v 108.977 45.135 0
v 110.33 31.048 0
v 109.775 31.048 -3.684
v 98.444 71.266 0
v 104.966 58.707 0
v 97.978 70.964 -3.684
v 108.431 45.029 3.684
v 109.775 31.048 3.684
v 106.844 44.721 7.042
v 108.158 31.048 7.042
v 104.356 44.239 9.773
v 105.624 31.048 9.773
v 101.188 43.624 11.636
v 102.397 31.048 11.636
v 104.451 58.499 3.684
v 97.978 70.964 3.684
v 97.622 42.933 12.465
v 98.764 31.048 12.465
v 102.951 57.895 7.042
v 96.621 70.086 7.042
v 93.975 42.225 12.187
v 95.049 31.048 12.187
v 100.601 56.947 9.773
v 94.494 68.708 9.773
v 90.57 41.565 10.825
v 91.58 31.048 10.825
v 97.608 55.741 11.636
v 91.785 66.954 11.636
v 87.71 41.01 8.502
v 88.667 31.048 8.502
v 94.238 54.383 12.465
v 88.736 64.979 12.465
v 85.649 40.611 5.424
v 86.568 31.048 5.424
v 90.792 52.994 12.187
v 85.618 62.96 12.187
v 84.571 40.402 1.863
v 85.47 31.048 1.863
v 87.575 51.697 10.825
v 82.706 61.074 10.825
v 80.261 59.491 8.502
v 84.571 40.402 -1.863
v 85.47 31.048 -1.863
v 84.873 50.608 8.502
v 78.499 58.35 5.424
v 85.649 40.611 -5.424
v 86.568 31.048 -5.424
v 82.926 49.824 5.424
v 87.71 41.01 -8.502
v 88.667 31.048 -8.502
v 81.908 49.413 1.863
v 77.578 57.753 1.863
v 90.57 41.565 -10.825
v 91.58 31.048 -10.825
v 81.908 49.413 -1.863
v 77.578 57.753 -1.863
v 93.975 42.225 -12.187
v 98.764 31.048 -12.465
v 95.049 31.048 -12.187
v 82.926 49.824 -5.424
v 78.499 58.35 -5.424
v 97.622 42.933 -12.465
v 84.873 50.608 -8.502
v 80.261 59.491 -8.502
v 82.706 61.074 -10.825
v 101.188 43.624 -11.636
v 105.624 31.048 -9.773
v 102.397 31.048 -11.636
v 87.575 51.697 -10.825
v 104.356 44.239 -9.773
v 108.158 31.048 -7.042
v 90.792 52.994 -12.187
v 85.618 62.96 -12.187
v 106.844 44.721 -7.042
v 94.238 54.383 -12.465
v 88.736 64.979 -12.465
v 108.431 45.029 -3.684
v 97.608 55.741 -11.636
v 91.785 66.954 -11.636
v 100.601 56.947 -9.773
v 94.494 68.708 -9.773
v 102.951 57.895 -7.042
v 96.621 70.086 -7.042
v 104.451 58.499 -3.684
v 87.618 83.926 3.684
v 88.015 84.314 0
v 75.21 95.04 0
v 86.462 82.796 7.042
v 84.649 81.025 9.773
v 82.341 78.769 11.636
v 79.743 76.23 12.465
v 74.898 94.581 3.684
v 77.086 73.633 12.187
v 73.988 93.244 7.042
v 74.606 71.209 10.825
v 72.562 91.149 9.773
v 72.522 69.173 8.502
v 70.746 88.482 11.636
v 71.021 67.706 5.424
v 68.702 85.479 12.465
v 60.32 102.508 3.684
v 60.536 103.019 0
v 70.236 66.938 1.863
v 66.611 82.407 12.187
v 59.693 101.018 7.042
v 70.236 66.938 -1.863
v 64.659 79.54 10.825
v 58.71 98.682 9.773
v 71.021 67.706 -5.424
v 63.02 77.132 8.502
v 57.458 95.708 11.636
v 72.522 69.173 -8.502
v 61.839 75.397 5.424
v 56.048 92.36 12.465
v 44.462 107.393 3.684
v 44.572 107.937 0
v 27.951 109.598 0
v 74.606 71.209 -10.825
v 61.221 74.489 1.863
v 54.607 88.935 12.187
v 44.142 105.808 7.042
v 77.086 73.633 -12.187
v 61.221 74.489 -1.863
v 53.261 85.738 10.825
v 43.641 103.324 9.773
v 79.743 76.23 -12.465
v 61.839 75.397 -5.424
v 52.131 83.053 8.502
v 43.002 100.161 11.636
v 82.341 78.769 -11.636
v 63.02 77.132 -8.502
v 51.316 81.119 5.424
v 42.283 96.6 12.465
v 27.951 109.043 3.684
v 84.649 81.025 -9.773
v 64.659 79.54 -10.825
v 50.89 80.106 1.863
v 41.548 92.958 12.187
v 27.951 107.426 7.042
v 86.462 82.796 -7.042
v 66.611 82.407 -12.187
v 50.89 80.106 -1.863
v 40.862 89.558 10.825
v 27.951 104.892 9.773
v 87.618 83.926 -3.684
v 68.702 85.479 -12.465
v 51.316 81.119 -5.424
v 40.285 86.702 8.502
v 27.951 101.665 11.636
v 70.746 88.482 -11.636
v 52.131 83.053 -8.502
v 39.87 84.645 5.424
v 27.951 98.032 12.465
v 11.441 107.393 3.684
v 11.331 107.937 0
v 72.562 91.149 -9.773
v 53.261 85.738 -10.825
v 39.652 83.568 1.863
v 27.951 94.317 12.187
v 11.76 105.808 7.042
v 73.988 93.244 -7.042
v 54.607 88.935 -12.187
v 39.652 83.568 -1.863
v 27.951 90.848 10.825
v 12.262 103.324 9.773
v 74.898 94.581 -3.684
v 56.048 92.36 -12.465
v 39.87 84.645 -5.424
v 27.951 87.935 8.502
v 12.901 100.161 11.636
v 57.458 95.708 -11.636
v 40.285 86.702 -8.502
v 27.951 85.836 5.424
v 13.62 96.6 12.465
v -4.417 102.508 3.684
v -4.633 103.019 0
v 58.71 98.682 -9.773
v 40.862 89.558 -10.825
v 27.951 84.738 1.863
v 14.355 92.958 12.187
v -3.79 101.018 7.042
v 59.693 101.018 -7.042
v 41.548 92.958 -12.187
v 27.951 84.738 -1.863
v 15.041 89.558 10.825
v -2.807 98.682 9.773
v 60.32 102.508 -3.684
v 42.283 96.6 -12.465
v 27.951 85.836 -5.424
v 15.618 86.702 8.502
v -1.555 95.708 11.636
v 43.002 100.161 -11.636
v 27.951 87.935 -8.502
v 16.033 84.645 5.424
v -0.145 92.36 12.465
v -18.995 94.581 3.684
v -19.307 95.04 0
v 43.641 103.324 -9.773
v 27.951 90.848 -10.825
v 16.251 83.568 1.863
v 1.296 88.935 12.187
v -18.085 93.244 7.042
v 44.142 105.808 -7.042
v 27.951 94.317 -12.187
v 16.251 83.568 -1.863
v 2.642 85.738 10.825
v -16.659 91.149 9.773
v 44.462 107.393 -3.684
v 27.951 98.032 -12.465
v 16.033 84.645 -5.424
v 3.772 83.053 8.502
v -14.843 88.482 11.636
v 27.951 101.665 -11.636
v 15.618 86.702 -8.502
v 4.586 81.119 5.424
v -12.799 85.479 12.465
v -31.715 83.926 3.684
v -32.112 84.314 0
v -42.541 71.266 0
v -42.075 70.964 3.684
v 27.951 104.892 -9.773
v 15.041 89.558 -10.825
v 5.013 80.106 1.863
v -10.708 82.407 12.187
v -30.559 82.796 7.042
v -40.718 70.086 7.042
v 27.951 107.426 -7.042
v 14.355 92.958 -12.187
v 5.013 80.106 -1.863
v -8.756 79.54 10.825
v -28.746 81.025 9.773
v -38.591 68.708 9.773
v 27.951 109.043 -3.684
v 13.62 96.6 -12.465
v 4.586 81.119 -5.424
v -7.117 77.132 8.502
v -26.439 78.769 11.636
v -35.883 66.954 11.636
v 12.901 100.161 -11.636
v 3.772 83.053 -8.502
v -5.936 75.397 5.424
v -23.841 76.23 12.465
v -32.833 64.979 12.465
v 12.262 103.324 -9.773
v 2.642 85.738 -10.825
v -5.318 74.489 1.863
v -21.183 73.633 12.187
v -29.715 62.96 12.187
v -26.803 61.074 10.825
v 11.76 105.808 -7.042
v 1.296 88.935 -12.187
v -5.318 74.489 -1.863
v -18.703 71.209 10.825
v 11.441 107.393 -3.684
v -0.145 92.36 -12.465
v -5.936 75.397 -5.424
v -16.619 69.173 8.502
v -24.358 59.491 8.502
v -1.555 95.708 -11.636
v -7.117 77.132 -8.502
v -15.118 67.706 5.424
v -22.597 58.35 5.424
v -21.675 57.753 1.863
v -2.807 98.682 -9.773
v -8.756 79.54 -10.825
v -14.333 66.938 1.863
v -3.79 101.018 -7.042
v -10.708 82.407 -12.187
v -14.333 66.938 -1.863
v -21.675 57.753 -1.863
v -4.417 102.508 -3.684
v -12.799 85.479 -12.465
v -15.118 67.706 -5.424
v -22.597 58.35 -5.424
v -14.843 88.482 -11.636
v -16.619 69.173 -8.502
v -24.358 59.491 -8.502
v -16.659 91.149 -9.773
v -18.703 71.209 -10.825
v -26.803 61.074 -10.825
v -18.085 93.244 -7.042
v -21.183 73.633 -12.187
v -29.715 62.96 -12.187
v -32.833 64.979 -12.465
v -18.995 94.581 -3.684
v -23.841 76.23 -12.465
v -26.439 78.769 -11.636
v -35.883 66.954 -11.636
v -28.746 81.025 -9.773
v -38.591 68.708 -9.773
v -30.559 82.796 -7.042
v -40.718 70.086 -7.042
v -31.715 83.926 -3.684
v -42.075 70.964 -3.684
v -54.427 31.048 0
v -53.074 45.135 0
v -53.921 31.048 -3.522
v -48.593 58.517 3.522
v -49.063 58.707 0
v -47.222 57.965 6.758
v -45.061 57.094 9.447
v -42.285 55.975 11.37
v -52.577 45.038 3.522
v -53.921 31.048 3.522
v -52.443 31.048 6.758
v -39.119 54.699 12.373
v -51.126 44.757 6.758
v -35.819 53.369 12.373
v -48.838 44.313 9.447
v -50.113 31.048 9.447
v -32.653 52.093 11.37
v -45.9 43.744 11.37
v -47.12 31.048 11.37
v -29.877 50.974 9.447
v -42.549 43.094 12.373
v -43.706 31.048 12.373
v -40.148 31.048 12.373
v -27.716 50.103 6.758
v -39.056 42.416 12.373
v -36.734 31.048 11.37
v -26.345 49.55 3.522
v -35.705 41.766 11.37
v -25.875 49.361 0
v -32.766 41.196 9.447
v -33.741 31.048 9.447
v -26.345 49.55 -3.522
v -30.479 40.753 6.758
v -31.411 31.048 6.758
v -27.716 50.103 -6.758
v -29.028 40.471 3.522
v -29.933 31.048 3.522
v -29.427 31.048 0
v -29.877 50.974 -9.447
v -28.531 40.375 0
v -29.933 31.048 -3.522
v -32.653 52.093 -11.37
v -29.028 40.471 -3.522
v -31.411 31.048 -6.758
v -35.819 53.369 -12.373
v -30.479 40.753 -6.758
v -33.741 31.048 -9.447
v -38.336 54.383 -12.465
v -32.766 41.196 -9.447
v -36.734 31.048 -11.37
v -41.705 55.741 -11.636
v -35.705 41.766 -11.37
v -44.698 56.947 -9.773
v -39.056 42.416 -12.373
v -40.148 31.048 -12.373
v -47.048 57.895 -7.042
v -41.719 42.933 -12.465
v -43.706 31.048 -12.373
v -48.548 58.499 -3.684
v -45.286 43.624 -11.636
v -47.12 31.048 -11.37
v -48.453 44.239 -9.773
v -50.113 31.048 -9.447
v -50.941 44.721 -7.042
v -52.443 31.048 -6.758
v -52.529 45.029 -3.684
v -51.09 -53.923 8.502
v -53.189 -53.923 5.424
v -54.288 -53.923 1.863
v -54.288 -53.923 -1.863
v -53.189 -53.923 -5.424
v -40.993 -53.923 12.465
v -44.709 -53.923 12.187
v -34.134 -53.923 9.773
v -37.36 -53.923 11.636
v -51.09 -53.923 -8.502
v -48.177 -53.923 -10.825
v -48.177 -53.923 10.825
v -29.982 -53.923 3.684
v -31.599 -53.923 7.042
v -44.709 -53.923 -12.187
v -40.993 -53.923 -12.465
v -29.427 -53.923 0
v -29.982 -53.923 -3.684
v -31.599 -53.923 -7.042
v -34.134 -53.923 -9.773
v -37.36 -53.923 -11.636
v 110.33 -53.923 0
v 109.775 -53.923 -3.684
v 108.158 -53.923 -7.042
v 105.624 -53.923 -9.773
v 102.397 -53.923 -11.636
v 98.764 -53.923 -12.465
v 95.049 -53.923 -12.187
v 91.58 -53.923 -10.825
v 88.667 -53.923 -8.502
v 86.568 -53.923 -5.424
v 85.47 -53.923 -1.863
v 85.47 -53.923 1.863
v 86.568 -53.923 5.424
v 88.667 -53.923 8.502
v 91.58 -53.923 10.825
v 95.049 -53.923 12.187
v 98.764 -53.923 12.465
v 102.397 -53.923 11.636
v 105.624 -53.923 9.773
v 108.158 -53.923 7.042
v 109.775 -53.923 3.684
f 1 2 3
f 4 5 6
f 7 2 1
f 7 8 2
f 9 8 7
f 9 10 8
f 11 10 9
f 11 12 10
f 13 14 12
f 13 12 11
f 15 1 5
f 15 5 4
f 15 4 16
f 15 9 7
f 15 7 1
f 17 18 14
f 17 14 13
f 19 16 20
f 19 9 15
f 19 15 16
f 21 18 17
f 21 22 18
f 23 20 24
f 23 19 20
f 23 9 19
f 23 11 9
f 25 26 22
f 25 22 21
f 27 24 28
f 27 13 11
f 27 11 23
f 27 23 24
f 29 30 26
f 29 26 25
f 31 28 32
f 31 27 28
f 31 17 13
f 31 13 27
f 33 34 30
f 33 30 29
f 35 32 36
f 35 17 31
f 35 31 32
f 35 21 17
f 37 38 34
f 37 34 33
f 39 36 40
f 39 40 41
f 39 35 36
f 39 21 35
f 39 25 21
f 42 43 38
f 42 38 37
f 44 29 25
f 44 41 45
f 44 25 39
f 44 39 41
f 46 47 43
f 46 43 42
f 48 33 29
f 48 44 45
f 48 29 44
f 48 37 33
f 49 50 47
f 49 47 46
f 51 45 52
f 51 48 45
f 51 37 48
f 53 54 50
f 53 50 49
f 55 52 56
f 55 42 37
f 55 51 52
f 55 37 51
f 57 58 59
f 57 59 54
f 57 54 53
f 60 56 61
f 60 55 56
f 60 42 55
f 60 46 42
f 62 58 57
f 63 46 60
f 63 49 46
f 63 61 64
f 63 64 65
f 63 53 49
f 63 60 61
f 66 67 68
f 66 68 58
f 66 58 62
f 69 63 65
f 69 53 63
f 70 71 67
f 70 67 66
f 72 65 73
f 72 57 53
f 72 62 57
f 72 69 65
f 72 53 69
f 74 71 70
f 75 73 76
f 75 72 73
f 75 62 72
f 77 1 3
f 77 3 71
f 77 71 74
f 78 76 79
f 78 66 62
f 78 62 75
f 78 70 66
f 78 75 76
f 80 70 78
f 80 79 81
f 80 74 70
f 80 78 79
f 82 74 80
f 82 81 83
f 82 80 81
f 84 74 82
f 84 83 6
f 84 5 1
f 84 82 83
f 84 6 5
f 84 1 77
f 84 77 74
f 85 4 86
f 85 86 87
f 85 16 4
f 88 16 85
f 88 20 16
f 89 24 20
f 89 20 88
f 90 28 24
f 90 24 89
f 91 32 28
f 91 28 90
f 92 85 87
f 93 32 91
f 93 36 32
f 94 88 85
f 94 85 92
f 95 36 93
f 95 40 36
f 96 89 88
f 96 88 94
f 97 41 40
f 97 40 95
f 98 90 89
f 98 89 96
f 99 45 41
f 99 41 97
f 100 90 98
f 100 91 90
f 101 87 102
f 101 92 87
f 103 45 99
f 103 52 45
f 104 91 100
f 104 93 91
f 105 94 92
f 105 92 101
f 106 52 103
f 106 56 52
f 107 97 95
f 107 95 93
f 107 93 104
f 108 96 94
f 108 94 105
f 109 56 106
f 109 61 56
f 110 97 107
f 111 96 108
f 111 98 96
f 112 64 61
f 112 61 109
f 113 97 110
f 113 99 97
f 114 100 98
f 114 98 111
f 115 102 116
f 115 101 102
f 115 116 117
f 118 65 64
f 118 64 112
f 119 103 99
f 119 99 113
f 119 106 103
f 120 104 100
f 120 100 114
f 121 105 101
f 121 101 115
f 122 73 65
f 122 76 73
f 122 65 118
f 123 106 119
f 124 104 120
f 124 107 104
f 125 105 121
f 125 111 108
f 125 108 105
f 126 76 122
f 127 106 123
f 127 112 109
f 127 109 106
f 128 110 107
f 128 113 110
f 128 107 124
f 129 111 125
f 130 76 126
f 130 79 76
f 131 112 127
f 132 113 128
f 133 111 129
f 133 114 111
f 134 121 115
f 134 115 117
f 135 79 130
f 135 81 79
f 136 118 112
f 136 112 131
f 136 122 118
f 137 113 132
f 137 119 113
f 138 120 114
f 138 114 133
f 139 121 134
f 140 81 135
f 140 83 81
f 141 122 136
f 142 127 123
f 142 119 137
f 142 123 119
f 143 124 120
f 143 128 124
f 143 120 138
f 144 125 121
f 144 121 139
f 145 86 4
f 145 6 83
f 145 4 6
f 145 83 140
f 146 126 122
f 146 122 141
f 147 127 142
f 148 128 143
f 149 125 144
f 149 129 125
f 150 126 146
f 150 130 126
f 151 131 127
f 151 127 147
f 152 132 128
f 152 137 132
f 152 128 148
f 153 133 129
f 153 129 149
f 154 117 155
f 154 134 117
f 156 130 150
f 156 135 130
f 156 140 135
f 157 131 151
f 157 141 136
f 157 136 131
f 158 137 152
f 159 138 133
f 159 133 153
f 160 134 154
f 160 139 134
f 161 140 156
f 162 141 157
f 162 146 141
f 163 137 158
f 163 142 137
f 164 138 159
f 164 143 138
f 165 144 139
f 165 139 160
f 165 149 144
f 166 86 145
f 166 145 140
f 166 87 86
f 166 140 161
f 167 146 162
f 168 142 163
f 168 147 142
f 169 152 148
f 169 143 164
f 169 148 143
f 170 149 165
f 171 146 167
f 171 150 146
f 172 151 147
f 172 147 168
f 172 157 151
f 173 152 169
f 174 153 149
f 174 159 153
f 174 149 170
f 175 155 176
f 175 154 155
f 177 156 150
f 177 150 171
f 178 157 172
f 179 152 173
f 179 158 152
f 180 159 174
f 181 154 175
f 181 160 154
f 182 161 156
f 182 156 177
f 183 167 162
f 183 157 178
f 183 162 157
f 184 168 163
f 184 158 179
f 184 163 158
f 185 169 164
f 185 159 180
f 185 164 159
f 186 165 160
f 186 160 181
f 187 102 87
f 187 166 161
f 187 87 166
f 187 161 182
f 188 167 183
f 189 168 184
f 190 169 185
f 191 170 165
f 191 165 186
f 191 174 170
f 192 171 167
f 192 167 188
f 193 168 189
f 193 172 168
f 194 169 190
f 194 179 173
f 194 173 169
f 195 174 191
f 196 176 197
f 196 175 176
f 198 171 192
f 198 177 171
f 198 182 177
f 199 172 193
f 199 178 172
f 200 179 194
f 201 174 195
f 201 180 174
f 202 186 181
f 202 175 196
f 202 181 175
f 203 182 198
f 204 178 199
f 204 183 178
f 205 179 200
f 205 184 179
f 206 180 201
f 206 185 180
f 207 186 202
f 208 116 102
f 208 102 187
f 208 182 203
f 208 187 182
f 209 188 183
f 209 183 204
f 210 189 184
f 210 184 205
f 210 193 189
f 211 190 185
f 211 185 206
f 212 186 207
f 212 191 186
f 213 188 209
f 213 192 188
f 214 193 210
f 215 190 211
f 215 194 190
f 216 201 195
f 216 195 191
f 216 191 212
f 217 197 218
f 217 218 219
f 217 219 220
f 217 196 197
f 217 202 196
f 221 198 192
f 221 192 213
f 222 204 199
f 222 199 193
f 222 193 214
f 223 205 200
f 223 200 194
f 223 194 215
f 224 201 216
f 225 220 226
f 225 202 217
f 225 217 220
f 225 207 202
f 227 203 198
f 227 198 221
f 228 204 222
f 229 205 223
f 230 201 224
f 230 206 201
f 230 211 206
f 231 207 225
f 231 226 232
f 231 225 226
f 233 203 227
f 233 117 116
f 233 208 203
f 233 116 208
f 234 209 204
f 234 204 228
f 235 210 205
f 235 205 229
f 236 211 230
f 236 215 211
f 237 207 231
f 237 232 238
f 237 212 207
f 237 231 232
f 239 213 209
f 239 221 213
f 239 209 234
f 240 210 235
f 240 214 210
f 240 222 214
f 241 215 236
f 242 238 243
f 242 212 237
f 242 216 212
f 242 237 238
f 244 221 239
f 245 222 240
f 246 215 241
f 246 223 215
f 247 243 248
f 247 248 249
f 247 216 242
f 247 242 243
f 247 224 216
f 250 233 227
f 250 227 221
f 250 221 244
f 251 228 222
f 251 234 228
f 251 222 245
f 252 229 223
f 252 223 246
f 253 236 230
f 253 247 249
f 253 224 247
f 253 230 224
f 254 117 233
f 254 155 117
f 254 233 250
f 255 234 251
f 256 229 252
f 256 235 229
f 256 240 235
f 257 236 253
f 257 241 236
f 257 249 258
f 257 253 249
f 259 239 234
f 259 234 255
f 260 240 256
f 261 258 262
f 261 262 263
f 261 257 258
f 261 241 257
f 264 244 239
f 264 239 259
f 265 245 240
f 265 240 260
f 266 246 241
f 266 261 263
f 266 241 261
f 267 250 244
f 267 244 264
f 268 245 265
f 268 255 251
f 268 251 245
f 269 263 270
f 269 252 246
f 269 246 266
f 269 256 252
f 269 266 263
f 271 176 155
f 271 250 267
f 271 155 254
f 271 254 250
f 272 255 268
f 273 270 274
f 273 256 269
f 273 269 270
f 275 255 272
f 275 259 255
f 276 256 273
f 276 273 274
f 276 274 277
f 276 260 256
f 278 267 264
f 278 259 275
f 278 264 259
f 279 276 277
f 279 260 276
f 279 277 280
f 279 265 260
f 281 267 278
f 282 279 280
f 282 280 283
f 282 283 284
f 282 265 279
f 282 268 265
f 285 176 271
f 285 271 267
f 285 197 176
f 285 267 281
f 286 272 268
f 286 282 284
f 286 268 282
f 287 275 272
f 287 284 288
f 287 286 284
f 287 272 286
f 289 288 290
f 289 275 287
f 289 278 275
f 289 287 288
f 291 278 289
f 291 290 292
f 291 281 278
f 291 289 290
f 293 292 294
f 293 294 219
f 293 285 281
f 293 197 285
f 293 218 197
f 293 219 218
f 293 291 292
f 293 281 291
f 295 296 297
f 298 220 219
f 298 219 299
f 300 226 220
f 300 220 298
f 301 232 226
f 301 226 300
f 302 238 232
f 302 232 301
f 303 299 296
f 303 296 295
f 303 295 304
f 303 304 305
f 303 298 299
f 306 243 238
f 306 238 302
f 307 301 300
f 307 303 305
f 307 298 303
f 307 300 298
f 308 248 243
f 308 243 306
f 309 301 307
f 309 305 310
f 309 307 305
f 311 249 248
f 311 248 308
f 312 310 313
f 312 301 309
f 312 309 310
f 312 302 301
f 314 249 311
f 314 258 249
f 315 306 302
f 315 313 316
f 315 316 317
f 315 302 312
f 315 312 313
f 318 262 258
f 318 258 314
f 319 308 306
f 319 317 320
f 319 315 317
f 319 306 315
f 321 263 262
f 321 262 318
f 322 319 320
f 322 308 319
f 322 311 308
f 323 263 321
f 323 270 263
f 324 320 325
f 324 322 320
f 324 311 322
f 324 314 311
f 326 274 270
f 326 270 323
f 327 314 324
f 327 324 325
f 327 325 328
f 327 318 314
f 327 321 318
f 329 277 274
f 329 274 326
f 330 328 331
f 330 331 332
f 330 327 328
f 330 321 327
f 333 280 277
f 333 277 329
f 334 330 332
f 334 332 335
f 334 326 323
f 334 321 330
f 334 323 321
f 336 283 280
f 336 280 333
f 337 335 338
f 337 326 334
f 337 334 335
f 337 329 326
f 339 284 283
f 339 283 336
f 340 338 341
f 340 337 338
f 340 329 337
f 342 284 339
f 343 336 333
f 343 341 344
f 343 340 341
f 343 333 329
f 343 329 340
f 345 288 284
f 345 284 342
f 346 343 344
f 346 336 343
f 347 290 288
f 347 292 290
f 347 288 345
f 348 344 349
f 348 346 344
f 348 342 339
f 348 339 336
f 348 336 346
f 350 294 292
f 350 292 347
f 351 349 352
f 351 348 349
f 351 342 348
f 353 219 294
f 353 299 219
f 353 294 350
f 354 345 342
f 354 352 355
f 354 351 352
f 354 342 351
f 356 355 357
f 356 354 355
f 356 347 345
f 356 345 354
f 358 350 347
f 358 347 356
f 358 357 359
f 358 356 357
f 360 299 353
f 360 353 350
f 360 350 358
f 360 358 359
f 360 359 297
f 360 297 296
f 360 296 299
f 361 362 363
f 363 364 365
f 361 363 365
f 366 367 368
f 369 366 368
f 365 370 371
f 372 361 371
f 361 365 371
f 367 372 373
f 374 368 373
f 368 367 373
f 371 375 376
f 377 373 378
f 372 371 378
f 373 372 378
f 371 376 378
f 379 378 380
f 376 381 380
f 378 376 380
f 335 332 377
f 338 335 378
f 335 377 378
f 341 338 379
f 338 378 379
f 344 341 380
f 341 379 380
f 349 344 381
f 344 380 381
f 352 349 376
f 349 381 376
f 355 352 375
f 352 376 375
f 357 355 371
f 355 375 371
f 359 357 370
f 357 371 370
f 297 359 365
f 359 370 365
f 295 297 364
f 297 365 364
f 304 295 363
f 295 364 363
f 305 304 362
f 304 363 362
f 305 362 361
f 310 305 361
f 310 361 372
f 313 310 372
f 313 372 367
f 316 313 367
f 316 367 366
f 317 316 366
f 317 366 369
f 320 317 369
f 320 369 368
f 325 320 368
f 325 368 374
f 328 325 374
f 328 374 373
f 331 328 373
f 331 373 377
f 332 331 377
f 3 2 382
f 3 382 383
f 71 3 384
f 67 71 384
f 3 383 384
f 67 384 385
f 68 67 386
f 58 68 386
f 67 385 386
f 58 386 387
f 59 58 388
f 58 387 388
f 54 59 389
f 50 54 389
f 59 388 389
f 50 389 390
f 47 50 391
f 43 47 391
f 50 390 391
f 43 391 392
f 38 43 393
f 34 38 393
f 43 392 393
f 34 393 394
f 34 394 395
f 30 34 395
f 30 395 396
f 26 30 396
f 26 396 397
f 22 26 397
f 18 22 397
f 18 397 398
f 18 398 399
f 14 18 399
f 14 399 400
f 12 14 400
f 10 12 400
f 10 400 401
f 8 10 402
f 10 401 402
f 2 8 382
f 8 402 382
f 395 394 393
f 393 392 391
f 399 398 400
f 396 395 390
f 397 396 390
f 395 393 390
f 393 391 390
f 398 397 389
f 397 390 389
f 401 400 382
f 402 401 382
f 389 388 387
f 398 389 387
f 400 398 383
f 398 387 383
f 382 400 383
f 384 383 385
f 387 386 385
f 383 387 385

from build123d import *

# Parameters (mm, degrees)
SWEEP1_OUTLINE_R   = 5
SWEEP1_DEPTH       = 33.988332717
SWEEP1_2_OUTLINE_R = 5
SWEEP1_2_ANGLE     = 32.92809
SWEEP1_3_OUTLINE_R = 5
SWEEP1_3_ANGLE     = 114.14382
SWEEP1_4_OUTLINE_R = 5
SWEEP1_4_ANGLE     = 32.92809
SCALE7_SCALE       = 2.5


with BuildPart() as part:
    # Sweep1: read off the stored shape, not the designer's step
    # Sweep1 outline → Sweep1 (new body)
    with BuildSketch(Plane(origin=(0, 0, 0), x_dir=(1, 0, 0), z_dir=(0, 1, 0))):
        with Locations((55.902877487, 0)):
            Circle(SWEEP1_OUTLINE_R)
        Circle(SWEEP1_OUTLINE_R)
    extrude(amount=SWEEP1_DEPTH)



with BuildPart() as body_2:
    # Sweep1 2 outline → Sweep1 2 (revolve)
    with BuildSketch(Plane(origin=(31.307900209, 33.988332717, 0), x_dir=(1, 0, 0), z_dir=(0, -1, 0))):
        with Locations((24.594977278, 0)):
            Circle(SWEEP1_2_OUTLINE_R)
    revolve(axis=Axis((31.307900209, 33.988332717, 0), (0, 0, 1)), revolution_arc=SWEEP1_2_ANGLE)

    # Sweep1 3 outline → Sweep1 3 (revolve)
    with BuildSketch(Plane(origin=(27.951438743, 31.814605451, 0), x_dir=(0.8393534671240316, 0.5435860164011462, 0), z_dir=(0.5435860164011462, -0.8393534671240316, 0))):
        with Locations((28.593842592, 0)):
            Circle(SWEEP1_3_OUTLINE_R)
    revolve(axis=Axis((27.951438743, 31.814605451, 0), (0, 0, 1)), revolution_arc=SWEEP1_3_ANGLE)


with BuildPart() as part_1:
    add(part.part)

    add(body_2.part)  # Sweep1 4 merges body 2
    # Sweep1 4 outline → Sweep1 4 (revolve)
    with BuildSketch(Plane(origin=(24.594977278, 33.988332717, 0), x_dir=(-0.8393534671240301, 0.5435860164011485, 0), z_dir=(0.5435860164011485, 0.8393534671240301, 0))):
        with Locations((24.594977278, 0)):
            Circle(SWEEP1_4_OUTLINE_R)
    revolve(axis=Axis((24.594977278, 33.988332717, 0), (0, 0, 1)), revolution_arc=SWEEP1_4_ANGLE)


with BuildPart() as part_2:
    # Scale7: scaled about (27.951438772, 35.9486859, 0)
    add(part_1.part.scale(SCALE7_SCALE).moved(Location((-41.927158158, -53.92302885, 0))))


solid = part_2.part
